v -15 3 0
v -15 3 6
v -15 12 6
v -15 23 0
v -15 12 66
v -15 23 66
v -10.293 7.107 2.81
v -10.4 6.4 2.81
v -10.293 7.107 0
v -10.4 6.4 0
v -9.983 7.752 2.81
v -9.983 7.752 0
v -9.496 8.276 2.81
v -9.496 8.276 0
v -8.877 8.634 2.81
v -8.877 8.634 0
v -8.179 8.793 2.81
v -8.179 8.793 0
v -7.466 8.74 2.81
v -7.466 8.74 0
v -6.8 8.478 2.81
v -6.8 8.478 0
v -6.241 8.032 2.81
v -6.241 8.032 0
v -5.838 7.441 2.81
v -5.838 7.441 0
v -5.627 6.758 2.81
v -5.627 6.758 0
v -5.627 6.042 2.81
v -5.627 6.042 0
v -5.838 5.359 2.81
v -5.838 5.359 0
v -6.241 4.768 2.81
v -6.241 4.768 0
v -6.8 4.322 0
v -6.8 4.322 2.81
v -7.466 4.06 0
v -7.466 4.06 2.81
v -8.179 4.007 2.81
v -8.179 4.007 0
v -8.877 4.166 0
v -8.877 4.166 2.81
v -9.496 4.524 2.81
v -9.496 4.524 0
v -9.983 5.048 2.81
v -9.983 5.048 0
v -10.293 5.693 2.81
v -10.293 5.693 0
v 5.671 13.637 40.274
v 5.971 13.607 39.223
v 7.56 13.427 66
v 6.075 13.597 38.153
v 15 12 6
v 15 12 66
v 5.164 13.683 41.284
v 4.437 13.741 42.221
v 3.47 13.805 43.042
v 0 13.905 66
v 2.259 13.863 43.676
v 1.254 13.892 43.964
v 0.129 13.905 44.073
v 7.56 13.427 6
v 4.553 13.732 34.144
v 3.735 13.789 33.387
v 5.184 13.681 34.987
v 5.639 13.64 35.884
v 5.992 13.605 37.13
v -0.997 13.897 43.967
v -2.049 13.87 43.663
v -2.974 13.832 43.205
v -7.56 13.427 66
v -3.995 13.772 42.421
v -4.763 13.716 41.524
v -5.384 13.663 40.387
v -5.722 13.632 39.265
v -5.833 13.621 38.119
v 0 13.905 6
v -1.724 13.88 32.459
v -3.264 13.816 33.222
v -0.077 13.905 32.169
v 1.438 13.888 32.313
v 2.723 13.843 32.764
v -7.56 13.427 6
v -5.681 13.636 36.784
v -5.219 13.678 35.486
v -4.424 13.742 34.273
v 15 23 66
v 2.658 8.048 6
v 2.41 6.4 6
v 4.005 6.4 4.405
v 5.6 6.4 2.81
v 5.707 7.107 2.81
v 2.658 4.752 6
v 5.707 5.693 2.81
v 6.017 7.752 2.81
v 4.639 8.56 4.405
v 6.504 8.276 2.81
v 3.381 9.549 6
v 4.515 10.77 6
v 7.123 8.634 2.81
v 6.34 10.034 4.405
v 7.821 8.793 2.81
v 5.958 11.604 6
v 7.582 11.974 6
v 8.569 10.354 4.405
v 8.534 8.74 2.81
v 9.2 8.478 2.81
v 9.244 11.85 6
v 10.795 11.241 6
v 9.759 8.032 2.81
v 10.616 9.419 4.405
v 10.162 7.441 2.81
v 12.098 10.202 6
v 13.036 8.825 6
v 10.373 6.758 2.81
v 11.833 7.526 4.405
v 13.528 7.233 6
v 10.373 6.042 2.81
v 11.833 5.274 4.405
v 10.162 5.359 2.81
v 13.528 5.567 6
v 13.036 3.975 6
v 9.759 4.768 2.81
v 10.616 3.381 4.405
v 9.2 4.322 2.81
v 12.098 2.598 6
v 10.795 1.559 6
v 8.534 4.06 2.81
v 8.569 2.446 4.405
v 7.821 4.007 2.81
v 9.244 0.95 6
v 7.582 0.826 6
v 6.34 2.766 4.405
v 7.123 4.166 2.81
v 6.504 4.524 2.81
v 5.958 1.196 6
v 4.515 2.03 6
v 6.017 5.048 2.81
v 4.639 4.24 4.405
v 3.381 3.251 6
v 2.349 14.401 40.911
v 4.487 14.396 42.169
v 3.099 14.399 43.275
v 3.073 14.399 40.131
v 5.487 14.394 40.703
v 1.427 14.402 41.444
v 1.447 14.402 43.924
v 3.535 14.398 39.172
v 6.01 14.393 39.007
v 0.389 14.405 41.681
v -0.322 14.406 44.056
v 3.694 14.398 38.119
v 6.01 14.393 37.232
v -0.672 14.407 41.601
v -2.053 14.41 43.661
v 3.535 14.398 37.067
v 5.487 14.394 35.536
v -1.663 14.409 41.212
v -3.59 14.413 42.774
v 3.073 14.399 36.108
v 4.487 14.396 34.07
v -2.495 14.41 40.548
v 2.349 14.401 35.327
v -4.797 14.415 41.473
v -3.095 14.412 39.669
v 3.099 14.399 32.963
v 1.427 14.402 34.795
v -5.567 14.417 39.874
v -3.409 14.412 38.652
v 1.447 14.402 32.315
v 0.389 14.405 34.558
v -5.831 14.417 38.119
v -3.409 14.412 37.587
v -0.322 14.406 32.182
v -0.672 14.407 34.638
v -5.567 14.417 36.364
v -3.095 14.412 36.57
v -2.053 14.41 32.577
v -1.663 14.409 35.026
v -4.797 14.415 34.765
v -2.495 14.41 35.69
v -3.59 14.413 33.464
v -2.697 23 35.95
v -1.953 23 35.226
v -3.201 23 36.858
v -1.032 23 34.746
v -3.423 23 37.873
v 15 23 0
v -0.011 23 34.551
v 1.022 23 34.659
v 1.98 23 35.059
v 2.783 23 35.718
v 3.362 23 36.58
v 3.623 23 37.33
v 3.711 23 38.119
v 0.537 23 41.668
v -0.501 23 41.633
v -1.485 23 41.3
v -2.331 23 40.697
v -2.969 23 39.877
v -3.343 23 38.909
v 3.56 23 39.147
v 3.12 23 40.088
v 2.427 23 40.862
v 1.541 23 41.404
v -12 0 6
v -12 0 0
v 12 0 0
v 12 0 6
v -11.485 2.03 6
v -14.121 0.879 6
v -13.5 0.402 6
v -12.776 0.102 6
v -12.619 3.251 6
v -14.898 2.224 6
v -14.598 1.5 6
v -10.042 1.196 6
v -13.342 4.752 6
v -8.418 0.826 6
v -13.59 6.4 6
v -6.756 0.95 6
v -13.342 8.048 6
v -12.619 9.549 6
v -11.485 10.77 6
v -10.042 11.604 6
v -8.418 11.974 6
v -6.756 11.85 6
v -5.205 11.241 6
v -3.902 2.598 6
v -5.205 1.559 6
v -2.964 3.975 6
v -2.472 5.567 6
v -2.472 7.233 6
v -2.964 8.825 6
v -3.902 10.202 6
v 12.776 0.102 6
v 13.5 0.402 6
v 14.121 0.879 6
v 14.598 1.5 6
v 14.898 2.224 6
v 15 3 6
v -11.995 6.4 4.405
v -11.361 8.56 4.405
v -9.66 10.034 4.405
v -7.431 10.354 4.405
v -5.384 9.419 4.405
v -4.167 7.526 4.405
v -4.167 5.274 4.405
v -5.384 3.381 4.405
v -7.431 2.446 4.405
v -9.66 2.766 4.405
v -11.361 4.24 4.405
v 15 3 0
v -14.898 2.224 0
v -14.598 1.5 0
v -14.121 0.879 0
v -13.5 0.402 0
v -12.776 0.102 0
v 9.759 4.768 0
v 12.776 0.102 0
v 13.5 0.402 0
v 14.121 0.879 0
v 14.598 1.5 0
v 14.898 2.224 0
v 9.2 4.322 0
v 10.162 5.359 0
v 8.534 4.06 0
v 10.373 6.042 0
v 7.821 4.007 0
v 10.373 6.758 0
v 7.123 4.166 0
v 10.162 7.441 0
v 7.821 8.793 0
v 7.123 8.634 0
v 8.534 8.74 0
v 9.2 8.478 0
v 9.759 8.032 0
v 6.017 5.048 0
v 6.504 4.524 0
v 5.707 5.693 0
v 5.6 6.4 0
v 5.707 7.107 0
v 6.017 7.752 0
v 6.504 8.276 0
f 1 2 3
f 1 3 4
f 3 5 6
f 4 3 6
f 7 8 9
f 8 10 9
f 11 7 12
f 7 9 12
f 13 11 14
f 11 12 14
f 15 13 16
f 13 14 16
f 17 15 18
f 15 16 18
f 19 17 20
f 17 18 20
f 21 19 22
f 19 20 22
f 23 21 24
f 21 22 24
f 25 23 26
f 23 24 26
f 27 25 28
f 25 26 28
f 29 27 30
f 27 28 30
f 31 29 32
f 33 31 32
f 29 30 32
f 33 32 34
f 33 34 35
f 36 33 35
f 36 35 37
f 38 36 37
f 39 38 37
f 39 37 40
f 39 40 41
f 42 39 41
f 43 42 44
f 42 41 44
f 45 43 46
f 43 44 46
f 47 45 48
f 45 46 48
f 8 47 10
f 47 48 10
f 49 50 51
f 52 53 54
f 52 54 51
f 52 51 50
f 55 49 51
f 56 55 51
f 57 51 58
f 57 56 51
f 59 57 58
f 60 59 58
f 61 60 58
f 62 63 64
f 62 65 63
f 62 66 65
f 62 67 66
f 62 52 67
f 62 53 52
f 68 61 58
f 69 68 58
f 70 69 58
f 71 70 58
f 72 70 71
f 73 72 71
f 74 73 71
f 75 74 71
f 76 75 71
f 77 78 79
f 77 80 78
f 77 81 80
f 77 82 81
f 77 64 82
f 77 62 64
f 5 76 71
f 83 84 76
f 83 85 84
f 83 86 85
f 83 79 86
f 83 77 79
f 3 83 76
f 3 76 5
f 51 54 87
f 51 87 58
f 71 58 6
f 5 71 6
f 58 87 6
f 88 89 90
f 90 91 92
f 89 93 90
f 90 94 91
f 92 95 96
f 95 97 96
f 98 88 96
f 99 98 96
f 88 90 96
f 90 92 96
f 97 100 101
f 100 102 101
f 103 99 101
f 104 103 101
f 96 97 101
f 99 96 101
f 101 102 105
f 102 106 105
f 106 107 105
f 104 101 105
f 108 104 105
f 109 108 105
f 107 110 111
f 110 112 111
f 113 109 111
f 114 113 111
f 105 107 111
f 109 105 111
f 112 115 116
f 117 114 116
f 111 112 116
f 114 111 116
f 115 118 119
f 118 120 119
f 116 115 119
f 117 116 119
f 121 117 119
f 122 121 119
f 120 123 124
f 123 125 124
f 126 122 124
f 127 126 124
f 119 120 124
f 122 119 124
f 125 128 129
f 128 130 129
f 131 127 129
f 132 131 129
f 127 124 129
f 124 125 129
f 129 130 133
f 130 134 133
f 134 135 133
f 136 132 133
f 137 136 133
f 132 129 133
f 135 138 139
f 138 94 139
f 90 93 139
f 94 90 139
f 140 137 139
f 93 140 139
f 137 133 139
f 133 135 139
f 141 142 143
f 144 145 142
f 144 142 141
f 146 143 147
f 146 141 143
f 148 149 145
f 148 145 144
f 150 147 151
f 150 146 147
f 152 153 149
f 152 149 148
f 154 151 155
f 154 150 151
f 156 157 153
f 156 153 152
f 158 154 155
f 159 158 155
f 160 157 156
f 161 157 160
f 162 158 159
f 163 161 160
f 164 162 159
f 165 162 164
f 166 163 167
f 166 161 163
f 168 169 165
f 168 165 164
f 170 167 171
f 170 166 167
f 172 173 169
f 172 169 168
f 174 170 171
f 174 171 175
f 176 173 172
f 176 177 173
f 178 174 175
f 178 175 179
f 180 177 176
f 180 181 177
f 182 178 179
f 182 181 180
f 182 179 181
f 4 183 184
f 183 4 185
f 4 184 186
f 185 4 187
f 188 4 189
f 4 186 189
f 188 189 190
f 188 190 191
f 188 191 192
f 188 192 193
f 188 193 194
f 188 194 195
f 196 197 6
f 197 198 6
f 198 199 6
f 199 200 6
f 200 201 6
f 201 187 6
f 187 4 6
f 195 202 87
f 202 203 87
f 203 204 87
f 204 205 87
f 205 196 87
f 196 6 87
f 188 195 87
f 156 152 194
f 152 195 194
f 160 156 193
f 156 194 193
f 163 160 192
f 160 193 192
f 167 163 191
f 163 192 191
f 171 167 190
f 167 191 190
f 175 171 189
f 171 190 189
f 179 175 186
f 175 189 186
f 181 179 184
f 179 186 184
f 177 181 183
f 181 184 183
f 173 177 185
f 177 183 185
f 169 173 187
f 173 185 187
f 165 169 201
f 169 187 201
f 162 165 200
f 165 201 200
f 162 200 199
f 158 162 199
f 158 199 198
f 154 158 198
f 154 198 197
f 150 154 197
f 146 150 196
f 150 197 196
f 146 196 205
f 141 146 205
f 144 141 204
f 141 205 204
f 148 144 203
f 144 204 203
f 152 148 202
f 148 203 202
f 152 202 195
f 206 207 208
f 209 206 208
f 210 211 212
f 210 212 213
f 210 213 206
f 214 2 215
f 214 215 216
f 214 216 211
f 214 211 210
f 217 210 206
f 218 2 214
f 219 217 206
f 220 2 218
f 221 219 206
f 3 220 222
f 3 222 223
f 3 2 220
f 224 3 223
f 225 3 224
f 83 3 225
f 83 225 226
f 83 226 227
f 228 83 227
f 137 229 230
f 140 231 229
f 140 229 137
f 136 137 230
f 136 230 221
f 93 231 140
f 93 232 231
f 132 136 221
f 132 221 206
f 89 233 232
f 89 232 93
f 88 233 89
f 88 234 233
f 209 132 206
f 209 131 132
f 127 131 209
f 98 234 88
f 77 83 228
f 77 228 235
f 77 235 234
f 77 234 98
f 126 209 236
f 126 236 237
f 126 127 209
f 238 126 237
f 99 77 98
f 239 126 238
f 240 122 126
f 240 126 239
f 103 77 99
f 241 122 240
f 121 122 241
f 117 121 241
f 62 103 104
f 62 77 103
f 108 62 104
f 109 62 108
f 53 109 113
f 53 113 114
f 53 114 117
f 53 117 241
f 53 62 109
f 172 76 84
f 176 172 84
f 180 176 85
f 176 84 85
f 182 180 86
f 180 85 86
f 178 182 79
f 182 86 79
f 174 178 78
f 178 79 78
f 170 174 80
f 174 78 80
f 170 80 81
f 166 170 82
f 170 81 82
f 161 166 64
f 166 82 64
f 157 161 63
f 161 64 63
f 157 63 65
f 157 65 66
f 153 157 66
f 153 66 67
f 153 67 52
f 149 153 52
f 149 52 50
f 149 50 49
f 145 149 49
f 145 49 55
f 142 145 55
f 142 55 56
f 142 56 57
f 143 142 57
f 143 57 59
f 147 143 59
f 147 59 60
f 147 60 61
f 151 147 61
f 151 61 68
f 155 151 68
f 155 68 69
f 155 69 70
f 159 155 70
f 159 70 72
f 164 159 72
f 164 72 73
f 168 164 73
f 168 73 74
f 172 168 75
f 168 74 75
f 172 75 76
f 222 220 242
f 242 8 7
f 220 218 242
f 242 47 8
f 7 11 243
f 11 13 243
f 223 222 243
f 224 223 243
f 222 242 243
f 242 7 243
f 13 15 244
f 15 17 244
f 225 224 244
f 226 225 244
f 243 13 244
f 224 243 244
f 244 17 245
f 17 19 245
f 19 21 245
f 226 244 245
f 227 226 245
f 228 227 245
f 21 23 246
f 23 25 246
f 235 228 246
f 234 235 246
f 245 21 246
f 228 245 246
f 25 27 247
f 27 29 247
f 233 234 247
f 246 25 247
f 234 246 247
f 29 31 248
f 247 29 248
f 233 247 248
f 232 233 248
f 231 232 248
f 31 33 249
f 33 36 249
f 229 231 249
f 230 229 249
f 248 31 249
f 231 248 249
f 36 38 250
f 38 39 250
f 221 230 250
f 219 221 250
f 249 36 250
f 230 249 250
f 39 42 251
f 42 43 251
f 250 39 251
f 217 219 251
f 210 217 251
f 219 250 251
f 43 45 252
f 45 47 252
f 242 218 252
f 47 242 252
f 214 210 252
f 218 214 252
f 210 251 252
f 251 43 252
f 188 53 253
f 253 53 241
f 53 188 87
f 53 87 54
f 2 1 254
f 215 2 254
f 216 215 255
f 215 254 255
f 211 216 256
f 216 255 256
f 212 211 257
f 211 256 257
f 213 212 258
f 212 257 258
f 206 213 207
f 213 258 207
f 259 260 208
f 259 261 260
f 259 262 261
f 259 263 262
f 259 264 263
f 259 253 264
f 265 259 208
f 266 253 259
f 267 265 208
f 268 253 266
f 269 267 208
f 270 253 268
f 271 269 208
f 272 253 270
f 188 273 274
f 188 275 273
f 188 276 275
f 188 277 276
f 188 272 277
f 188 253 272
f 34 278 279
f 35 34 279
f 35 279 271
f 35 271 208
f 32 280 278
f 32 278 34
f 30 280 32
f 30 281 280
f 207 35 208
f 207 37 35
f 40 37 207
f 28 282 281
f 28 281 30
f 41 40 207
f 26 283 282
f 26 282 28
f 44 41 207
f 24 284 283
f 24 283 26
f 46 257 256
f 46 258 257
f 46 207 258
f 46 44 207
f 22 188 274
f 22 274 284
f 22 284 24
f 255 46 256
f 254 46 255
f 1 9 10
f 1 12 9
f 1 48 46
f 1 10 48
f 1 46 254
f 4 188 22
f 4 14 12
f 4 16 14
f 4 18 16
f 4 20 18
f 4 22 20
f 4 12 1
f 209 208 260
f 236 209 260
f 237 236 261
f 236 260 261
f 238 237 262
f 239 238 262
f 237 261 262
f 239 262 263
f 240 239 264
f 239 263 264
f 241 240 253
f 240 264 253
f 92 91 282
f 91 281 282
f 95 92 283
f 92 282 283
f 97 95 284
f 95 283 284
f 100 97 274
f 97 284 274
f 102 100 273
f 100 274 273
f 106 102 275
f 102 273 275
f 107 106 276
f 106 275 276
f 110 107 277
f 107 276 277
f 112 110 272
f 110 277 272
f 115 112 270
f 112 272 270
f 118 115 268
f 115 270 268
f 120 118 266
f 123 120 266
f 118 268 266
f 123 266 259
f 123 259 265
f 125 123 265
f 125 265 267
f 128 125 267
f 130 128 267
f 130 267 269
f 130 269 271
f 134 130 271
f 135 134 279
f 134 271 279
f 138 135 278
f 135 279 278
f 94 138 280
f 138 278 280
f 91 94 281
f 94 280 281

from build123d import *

# Parameters (mm, degrees)
AUFSATZ_LINEAR_AUSTRAGEN1_DEPTH                      = 6
FORMSENKUNG_F_R_M4_SENKSCHRAUBE_MIT_INNE_D           = 4.8
FORMSENKUNG_F_R_M4_SENKSCHRAUBE_MIT_INNE_CSINK_D     = 11.18
FORMSENKUNG_F_R_M4_SENKSCHRAUBE_MIT_INNE_CSINK_ANGLE = 90
AUFSATZ_LINEAR_AUSTRAGEN2_DEPTH                      = 60
AUFSATZ_LINEAR_AUSTRAGEN2_DEPTH_BACK                 = 6
STIRNSENKUNG_F_R_1_4_FLACHKOPFSCHRAUBE_D             = 7.14248
STIRNSENKUNG_F_R_1_4_FLACHKOPFSCHRAUBE_CBORE_D       = 11.90752
STIRNSENKUNG_F_R_1_4_FLACHKOPFSCHRAUBE_CBORE_DEPTH   = 0.500000016


with BuildPart() as part:
    # Skizze1 → Aufsatz-Linear austragen1 (new body)
    with BuildSketch(Plane.XY):
        with BuildLine():
            Line((-15, 12), (-15, 3))
            ThreePointArc((-15, 3), (-14.121320344, 0.878679656), (-12, 0))
            Line((-12, 0), (12, 0))
            ThreePointArc((12, 0), (14.121320344, 0.878679656), (15, 3))
            Line((15, 3), (15, 12))
            ThreePointArc((15, 12), (0, 13.905249807), (-15, 12))
        make_face()
    extrude(amount=AUFSATZ_LINEAR_AUSTRAGEN1_DEPTH)

    # Formsenkung für M4 Senkschraube mit Innensechskant1 (through all)
    with Locations(Plane.XY.offset(6)):
        with Locations((-8, 6.4), (8, 6.4)):
            CounterSinkHole(FORMSENKUNG_F_R_M4_SENKSCHRAUBE_MIT_INNE_D / 2, FORMSENKUNG_F_R_M4_SENKSCHRAUBE_MIT_INNE_CSINK_D / 2, counter_sink_angle=FORMSENKUNG_F_R_M4_SENKSCHRAUBE_MIT_INNE_CSINK_ANGLE)

    # Skizze4 → Aufsatz-Linear austragen2 (add, two sides)
    with BuildSketch(Plane.XY.offset(6)) as aufsatz_linear_austragen2_sk:
        with BuildLine():
            Line((-15, 12), (-15, 23))
            Line((-15, 23), (15, 23))
            Line((15, 23), (15, 12))
            ThreePointArc((15, 12), (0, 13.905249807), (-15, 12))
        make_face()
    extrude(amount=AUFSATZ_LINEAR_AUSTRAGEN2_DEPTH)
    extrude(aufsatz_linear_austragen2_sk.sketch, amount=-AUFSATZ_LINEAR_AUSTRAGEN2_DEPTH_BACK)

    # Stirnsenkung für 1/4 Flachkopfschraube (Kopf Button)1 (through all)
    with Locations(Plane(origin=(0.121475485, 13.905126838, 38.119269102), x_dir=(-0.999997951, 0.002024591, 0), z_dir=(-0.002024591, -0.999997951, 0))):
        with Locations((0, 0)):
            CounterBoreHole(STIRNSENKUNG_F_R_1_4_FLACHKOPFSCHRAUBE_D / 2, STIRNSENKUNG_F_R_1_4_FLACHKOPFSCHRAUBE_CBORE_D / 2, STIRNSENKUNG_F_R_1_4_FLACHKOPFSCHRAUBE_CBORE_DEPTH)


solid = part.part
